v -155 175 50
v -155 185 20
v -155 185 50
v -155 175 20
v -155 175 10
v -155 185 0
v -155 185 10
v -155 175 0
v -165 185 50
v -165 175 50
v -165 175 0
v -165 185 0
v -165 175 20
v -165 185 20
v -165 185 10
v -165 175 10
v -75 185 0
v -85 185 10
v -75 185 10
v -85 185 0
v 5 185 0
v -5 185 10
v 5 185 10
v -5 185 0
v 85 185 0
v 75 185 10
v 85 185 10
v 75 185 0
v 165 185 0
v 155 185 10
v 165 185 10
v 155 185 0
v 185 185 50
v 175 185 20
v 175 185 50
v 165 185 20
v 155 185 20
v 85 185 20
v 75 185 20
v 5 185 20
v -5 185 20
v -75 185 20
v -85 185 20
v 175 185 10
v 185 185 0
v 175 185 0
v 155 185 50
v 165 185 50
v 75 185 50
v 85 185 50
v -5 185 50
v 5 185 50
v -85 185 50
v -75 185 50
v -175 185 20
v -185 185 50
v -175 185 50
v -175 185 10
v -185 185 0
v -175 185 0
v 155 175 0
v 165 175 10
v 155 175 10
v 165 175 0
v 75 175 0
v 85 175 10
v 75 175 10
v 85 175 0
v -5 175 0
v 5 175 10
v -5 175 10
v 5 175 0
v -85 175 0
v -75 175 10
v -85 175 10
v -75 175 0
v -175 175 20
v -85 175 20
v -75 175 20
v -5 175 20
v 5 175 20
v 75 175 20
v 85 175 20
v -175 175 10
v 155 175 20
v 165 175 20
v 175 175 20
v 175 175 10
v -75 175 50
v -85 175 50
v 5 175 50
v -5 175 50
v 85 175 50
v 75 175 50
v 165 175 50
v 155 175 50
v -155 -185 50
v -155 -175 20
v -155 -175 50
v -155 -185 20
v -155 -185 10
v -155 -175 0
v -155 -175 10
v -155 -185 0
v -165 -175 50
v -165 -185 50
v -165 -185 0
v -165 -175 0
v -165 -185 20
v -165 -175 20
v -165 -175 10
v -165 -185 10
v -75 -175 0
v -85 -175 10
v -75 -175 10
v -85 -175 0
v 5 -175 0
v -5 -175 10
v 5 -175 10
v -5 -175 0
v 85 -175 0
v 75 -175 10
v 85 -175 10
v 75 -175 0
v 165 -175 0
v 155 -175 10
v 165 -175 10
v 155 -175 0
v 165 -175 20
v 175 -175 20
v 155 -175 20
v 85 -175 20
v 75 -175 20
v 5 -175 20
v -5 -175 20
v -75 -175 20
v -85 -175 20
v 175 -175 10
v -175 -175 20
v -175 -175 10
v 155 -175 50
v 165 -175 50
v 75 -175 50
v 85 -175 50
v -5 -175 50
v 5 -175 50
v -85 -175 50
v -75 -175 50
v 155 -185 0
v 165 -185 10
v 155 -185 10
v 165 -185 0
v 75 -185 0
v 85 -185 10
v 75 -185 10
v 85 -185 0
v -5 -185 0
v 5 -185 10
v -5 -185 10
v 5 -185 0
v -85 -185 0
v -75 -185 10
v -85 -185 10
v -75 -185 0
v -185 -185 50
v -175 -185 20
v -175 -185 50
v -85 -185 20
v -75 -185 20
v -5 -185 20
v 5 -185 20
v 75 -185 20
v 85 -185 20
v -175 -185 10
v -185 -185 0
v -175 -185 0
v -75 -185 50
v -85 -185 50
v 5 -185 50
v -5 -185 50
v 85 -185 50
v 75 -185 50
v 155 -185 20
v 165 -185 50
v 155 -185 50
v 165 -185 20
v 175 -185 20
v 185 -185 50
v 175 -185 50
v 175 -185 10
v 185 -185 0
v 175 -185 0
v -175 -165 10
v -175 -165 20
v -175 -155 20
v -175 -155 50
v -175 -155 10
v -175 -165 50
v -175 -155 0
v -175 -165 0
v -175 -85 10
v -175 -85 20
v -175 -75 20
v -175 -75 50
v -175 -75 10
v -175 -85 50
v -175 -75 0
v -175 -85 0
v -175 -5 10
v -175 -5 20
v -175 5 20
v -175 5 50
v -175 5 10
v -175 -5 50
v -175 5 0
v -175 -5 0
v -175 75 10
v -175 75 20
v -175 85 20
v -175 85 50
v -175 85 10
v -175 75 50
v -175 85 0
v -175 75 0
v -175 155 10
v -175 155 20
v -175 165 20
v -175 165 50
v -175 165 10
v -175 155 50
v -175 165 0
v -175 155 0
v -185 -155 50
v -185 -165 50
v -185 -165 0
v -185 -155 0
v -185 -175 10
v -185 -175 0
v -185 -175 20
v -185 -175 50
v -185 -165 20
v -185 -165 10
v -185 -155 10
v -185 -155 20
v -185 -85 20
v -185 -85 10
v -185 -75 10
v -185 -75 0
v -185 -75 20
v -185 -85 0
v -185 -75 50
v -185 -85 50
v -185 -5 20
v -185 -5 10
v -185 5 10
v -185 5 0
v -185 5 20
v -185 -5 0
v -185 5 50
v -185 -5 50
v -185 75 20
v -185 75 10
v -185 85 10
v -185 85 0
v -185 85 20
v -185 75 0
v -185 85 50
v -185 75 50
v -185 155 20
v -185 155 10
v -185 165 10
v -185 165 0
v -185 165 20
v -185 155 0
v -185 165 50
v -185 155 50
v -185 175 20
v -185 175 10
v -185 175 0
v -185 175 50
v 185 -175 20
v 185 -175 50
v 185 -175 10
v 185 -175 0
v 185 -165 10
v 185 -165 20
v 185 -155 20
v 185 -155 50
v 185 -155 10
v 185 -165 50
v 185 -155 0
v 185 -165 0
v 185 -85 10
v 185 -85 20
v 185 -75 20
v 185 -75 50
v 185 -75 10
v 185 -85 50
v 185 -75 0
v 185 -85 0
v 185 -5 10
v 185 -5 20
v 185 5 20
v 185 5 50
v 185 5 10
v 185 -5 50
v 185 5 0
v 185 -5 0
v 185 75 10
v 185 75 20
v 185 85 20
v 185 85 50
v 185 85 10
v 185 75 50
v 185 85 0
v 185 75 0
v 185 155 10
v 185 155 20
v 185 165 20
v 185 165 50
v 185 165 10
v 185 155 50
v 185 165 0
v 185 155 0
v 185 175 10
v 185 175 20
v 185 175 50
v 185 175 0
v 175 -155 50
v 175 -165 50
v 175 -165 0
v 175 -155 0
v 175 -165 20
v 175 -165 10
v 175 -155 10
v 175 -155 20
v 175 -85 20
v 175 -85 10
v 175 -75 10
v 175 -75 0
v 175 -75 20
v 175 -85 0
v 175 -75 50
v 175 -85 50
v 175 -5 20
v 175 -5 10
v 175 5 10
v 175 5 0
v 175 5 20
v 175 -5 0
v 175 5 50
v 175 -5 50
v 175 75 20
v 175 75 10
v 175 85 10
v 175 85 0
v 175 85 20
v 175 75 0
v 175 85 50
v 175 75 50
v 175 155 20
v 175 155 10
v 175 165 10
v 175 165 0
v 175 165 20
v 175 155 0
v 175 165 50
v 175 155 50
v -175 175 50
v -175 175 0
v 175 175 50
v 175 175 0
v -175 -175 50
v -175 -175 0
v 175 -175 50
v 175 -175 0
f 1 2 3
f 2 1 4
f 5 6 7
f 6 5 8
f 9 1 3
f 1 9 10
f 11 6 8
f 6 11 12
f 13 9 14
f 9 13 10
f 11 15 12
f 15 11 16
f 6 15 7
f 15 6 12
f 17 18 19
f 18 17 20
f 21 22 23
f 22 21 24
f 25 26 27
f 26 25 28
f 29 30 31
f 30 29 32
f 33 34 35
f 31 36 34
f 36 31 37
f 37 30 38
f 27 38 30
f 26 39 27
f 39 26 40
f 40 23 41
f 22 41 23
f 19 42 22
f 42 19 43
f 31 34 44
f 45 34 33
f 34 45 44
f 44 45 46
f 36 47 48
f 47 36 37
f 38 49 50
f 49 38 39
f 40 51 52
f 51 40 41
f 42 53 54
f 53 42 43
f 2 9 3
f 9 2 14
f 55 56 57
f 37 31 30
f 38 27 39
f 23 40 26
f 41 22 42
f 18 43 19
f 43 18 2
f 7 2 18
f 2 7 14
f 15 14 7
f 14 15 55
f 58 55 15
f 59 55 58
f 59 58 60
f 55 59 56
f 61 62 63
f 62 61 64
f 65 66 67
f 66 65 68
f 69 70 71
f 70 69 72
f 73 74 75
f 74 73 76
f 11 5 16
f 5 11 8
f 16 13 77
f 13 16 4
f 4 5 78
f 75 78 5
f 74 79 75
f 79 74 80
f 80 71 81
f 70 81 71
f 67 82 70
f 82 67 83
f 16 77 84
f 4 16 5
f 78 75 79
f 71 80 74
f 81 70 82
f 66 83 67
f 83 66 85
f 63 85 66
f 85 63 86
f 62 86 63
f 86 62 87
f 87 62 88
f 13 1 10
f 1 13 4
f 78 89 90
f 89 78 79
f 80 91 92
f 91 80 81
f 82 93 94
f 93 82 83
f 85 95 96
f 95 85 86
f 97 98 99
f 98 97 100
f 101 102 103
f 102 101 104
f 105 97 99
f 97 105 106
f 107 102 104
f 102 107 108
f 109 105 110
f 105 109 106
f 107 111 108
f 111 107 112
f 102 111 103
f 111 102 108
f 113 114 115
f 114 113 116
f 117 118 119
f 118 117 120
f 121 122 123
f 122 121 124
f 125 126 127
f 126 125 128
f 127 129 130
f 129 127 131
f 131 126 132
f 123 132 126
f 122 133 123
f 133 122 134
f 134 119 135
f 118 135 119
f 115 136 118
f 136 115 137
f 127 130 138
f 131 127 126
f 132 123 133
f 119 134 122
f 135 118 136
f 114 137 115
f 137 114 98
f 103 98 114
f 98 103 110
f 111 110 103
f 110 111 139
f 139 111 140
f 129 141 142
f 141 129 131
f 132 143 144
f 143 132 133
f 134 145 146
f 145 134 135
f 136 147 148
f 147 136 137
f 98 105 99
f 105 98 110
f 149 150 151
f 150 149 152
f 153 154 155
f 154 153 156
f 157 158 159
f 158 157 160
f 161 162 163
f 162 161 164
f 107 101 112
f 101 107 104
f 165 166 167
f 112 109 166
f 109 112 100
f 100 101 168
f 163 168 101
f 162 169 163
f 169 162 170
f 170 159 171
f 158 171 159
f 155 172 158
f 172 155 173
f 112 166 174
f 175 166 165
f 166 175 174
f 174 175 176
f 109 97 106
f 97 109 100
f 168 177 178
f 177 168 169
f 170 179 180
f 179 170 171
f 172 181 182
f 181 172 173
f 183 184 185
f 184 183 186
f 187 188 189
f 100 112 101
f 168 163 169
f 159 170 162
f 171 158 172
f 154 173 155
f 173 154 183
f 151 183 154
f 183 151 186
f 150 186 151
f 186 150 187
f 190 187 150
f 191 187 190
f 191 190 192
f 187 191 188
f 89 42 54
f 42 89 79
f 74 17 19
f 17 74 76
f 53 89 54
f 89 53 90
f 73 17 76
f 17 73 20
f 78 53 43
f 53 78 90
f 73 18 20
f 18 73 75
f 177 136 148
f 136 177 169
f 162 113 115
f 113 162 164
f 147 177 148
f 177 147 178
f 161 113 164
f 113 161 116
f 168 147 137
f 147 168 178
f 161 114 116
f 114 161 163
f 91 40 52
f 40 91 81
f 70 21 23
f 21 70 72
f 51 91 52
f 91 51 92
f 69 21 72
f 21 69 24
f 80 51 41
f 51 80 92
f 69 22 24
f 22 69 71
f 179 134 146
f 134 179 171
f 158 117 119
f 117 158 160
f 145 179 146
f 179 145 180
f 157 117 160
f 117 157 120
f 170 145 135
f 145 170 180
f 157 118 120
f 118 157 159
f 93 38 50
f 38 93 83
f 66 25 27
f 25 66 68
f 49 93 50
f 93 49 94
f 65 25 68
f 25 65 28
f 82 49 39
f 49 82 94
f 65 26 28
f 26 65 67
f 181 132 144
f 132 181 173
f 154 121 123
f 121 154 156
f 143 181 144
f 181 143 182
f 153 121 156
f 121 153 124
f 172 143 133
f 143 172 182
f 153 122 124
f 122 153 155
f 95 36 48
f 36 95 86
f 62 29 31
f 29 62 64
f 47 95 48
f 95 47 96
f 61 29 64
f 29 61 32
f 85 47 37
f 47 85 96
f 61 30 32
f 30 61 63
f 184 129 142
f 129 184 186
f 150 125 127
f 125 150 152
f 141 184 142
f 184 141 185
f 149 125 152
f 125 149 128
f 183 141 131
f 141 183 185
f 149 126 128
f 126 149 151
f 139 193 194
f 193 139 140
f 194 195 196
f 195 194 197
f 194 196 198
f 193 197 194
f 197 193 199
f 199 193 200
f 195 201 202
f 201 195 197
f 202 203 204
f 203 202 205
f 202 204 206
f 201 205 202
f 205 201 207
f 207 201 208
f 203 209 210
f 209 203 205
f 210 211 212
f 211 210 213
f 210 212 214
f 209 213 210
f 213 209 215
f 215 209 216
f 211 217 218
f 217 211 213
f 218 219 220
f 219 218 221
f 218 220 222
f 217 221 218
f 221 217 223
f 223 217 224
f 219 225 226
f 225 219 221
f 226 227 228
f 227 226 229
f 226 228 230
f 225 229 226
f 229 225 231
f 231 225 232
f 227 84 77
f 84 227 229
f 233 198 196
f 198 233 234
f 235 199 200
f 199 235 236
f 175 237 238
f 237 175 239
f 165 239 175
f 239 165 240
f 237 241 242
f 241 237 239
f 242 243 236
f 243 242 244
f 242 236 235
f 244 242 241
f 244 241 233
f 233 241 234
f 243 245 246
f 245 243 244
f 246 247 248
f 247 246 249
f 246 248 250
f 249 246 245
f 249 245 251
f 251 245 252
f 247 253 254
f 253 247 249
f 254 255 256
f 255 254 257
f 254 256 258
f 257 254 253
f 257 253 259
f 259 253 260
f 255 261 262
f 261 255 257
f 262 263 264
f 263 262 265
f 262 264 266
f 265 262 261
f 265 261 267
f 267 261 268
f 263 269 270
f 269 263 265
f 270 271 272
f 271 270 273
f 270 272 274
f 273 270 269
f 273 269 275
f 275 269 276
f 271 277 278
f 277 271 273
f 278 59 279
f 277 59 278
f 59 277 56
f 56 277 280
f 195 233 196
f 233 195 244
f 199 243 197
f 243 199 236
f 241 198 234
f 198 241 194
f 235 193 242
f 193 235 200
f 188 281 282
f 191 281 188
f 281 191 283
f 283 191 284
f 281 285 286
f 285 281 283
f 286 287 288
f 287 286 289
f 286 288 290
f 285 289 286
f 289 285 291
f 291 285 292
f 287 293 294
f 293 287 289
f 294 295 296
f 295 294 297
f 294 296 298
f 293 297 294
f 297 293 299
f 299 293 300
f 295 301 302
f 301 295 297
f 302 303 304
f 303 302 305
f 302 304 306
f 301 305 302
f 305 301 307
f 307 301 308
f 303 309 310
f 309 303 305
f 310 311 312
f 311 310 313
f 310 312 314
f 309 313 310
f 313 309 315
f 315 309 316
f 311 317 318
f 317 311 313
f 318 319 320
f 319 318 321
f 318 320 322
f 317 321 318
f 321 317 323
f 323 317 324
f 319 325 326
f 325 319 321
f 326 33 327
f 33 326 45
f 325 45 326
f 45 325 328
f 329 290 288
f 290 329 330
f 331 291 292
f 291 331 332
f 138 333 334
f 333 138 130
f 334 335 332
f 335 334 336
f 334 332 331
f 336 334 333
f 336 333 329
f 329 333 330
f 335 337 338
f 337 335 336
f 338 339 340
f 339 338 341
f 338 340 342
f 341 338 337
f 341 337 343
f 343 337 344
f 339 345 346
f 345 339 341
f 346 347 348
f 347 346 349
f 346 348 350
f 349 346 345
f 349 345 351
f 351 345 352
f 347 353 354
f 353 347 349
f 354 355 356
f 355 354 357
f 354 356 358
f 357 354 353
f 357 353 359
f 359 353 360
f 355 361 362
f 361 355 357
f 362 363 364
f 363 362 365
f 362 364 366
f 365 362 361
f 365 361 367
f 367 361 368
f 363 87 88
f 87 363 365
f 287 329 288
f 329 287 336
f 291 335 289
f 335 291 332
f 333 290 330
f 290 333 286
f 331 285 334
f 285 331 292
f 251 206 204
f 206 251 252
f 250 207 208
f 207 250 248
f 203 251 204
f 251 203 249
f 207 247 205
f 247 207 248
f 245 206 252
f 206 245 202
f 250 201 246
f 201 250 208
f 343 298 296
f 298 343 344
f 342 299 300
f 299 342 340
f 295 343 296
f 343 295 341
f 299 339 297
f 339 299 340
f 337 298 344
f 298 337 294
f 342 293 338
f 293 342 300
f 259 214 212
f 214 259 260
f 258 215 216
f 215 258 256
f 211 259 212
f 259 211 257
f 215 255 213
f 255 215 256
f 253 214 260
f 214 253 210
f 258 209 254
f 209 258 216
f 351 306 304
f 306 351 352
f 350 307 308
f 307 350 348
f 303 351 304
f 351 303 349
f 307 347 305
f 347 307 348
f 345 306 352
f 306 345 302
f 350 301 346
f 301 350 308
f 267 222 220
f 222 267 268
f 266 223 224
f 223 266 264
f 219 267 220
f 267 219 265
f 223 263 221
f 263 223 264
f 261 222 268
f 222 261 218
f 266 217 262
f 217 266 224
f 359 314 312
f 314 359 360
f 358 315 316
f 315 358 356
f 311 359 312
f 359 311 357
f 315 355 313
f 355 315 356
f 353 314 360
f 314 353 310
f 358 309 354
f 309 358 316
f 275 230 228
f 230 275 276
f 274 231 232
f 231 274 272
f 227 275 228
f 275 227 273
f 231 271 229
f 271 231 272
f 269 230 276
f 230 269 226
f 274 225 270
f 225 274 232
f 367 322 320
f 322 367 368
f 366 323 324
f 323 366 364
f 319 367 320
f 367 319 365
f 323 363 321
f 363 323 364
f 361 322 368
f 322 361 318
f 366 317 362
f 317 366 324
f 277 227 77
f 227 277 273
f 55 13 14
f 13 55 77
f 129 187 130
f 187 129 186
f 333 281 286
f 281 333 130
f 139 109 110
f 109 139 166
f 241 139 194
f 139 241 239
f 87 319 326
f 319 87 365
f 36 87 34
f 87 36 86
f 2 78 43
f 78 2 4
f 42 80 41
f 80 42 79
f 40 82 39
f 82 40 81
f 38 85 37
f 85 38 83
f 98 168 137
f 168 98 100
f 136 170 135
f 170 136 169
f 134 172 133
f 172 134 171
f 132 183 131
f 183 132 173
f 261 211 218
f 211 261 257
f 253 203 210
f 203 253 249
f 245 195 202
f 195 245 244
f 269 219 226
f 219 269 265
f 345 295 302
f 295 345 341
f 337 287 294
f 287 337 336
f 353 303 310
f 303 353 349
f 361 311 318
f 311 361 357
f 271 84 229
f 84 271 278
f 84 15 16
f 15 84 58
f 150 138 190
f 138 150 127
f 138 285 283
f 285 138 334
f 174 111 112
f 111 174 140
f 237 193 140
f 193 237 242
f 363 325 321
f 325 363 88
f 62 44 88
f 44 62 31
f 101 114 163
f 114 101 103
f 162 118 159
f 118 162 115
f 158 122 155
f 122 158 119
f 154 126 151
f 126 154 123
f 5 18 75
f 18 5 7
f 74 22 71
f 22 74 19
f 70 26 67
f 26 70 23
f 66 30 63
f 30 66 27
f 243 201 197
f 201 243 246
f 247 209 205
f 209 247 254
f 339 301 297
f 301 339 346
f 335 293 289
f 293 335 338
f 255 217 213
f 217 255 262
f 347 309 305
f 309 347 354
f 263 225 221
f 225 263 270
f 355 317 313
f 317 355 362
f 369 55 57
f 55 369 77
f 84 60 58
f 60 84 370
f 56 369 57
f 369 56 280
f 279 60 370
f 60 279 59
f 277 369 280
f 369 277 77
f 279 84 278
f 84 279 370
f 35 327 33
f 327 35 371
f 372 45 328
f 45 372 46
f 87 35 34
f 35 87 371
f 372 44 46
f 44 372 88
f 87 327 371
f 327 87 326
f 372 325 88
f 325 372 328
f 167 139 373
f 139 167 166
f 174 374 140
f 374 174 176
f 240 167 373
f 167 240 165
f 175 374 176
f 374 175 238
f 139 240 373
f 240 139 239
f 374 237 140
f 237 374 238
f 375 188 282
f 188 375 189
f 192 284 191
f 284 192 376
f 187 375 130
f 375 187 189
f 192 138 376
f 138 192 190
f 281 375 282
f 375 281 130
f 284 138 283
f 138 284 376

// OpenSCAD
// Cage slice 11
// Internal cavity: 350 x 350 x 700 mm
// Bar thickness: 10 mm (square)
// Gap between bars: 70 mm (uniform)
// Slice index: 11, slice Z range: [550, 600] (local coordinates 0..50)
// This file places the slice with its bottom on Z=0; when assembling, translate in Z by 550 mm.
// Export to STL with OpenSCAD: Render -> Export as STL.

bar = 10;
gap = 70;
s = bar + gap;
$fn = 64;  // cylinder resolution

x_centers = [-160, -80, 0, 80, 160];
y_centers = [-160, -80, 0, 80, 160];
z_centers = [5, 85, 165, 245, 325, 405, 485, 565, 645];

slice_index = 11;
slice_h = 50;

front_y = 180;
back_y = -180;
left_x = -180;
right_x = 180;
panel_length = 370;

hole_diam = 6.6;

module slice() {
    union() {
        // vertical bars on front and back (along Z)
        for (x = x_centers) {
            translate([x, front_y, slice_h/2]) cube([bar, bar, slice_h], center=true);
            translate([x, back_y, slice_h/2])  cube([bar, bar, slice_h], center=true);
        }
        // vertical bars on left and right (along Z)
        for (y = y_centers) {
            translate([left_x, y, slice_h/2])  cube([bar, bar, slice_h], center=true);
            translate([right_x, y, slice_h/2]) cube([bar, bar, slice_h], center=true);
        }
        // explicit corner vertical bars (ensure 4 corners for M6 rods)
        translate([-180, 180, slice_h/2]) cube([bar, bar, slice_h], center=true);
        translate([180, 180, slice_h/2]) cube([bar, bar, slice_h], center=true);
        translate([-180, -180, slice_h/2]) cube([bar, bar, slice_h], center=true);
        translate([180, -180, slice_h/2]) cube([bar, bar, slice_h], center=true);

        // horizontal bars (10 mm thick in Z) that lie inside this slice
        for (zc = z_centers) {
            z_local = zc - slice_index*slice_h;
            // include this horizontal bar if its center lies within this slice and it fits entirely here
            if (z_local >= bar/2 && z_local <= slice_h - bar/2) {
                // front and back horizontal bars (run along X)
                translate([0, front_y, z_local]) cube([panel_length, bar, bar], center=true);
                translate([0, back_y,  z_local]) cube([panel_length, bar, bar], center=true);
                // left and right horizontal bars (run along Y)
                translate([left_x, 0, z_local]) cube([bar, panel_length, bar], center=true);
                translate([right_x,0, z_local]) cube([bar, panel_length, bar], center=true);
            }
        }
    }
}

difference() {
    slice();
    // four vertical holes for M6 rods through corner bars (slightly longer than slice to ensure clean subtraction)
    translate([-180, 180, slice_h/2]) rotate([0,0,0]) cylinder(h = slice_h*4, r = hole_diam/2, center=true);
    translate([180, 180, slice_h/2]) rotate([0,0,0]) cylinder(h = slice_h*4, r = hole_diam/2, center=true);
    translate([-180, -180, slice_h/2]) rotate([0,0,0]) cylinder(h = slice_h*4, r = hole_diam/2, center=true);
    translate([180, -180, slice_h/2]) rotate([0,0,0]) cylinder(h = slice_h*4, r = hole_diam/2, center=true);
}

slice();
